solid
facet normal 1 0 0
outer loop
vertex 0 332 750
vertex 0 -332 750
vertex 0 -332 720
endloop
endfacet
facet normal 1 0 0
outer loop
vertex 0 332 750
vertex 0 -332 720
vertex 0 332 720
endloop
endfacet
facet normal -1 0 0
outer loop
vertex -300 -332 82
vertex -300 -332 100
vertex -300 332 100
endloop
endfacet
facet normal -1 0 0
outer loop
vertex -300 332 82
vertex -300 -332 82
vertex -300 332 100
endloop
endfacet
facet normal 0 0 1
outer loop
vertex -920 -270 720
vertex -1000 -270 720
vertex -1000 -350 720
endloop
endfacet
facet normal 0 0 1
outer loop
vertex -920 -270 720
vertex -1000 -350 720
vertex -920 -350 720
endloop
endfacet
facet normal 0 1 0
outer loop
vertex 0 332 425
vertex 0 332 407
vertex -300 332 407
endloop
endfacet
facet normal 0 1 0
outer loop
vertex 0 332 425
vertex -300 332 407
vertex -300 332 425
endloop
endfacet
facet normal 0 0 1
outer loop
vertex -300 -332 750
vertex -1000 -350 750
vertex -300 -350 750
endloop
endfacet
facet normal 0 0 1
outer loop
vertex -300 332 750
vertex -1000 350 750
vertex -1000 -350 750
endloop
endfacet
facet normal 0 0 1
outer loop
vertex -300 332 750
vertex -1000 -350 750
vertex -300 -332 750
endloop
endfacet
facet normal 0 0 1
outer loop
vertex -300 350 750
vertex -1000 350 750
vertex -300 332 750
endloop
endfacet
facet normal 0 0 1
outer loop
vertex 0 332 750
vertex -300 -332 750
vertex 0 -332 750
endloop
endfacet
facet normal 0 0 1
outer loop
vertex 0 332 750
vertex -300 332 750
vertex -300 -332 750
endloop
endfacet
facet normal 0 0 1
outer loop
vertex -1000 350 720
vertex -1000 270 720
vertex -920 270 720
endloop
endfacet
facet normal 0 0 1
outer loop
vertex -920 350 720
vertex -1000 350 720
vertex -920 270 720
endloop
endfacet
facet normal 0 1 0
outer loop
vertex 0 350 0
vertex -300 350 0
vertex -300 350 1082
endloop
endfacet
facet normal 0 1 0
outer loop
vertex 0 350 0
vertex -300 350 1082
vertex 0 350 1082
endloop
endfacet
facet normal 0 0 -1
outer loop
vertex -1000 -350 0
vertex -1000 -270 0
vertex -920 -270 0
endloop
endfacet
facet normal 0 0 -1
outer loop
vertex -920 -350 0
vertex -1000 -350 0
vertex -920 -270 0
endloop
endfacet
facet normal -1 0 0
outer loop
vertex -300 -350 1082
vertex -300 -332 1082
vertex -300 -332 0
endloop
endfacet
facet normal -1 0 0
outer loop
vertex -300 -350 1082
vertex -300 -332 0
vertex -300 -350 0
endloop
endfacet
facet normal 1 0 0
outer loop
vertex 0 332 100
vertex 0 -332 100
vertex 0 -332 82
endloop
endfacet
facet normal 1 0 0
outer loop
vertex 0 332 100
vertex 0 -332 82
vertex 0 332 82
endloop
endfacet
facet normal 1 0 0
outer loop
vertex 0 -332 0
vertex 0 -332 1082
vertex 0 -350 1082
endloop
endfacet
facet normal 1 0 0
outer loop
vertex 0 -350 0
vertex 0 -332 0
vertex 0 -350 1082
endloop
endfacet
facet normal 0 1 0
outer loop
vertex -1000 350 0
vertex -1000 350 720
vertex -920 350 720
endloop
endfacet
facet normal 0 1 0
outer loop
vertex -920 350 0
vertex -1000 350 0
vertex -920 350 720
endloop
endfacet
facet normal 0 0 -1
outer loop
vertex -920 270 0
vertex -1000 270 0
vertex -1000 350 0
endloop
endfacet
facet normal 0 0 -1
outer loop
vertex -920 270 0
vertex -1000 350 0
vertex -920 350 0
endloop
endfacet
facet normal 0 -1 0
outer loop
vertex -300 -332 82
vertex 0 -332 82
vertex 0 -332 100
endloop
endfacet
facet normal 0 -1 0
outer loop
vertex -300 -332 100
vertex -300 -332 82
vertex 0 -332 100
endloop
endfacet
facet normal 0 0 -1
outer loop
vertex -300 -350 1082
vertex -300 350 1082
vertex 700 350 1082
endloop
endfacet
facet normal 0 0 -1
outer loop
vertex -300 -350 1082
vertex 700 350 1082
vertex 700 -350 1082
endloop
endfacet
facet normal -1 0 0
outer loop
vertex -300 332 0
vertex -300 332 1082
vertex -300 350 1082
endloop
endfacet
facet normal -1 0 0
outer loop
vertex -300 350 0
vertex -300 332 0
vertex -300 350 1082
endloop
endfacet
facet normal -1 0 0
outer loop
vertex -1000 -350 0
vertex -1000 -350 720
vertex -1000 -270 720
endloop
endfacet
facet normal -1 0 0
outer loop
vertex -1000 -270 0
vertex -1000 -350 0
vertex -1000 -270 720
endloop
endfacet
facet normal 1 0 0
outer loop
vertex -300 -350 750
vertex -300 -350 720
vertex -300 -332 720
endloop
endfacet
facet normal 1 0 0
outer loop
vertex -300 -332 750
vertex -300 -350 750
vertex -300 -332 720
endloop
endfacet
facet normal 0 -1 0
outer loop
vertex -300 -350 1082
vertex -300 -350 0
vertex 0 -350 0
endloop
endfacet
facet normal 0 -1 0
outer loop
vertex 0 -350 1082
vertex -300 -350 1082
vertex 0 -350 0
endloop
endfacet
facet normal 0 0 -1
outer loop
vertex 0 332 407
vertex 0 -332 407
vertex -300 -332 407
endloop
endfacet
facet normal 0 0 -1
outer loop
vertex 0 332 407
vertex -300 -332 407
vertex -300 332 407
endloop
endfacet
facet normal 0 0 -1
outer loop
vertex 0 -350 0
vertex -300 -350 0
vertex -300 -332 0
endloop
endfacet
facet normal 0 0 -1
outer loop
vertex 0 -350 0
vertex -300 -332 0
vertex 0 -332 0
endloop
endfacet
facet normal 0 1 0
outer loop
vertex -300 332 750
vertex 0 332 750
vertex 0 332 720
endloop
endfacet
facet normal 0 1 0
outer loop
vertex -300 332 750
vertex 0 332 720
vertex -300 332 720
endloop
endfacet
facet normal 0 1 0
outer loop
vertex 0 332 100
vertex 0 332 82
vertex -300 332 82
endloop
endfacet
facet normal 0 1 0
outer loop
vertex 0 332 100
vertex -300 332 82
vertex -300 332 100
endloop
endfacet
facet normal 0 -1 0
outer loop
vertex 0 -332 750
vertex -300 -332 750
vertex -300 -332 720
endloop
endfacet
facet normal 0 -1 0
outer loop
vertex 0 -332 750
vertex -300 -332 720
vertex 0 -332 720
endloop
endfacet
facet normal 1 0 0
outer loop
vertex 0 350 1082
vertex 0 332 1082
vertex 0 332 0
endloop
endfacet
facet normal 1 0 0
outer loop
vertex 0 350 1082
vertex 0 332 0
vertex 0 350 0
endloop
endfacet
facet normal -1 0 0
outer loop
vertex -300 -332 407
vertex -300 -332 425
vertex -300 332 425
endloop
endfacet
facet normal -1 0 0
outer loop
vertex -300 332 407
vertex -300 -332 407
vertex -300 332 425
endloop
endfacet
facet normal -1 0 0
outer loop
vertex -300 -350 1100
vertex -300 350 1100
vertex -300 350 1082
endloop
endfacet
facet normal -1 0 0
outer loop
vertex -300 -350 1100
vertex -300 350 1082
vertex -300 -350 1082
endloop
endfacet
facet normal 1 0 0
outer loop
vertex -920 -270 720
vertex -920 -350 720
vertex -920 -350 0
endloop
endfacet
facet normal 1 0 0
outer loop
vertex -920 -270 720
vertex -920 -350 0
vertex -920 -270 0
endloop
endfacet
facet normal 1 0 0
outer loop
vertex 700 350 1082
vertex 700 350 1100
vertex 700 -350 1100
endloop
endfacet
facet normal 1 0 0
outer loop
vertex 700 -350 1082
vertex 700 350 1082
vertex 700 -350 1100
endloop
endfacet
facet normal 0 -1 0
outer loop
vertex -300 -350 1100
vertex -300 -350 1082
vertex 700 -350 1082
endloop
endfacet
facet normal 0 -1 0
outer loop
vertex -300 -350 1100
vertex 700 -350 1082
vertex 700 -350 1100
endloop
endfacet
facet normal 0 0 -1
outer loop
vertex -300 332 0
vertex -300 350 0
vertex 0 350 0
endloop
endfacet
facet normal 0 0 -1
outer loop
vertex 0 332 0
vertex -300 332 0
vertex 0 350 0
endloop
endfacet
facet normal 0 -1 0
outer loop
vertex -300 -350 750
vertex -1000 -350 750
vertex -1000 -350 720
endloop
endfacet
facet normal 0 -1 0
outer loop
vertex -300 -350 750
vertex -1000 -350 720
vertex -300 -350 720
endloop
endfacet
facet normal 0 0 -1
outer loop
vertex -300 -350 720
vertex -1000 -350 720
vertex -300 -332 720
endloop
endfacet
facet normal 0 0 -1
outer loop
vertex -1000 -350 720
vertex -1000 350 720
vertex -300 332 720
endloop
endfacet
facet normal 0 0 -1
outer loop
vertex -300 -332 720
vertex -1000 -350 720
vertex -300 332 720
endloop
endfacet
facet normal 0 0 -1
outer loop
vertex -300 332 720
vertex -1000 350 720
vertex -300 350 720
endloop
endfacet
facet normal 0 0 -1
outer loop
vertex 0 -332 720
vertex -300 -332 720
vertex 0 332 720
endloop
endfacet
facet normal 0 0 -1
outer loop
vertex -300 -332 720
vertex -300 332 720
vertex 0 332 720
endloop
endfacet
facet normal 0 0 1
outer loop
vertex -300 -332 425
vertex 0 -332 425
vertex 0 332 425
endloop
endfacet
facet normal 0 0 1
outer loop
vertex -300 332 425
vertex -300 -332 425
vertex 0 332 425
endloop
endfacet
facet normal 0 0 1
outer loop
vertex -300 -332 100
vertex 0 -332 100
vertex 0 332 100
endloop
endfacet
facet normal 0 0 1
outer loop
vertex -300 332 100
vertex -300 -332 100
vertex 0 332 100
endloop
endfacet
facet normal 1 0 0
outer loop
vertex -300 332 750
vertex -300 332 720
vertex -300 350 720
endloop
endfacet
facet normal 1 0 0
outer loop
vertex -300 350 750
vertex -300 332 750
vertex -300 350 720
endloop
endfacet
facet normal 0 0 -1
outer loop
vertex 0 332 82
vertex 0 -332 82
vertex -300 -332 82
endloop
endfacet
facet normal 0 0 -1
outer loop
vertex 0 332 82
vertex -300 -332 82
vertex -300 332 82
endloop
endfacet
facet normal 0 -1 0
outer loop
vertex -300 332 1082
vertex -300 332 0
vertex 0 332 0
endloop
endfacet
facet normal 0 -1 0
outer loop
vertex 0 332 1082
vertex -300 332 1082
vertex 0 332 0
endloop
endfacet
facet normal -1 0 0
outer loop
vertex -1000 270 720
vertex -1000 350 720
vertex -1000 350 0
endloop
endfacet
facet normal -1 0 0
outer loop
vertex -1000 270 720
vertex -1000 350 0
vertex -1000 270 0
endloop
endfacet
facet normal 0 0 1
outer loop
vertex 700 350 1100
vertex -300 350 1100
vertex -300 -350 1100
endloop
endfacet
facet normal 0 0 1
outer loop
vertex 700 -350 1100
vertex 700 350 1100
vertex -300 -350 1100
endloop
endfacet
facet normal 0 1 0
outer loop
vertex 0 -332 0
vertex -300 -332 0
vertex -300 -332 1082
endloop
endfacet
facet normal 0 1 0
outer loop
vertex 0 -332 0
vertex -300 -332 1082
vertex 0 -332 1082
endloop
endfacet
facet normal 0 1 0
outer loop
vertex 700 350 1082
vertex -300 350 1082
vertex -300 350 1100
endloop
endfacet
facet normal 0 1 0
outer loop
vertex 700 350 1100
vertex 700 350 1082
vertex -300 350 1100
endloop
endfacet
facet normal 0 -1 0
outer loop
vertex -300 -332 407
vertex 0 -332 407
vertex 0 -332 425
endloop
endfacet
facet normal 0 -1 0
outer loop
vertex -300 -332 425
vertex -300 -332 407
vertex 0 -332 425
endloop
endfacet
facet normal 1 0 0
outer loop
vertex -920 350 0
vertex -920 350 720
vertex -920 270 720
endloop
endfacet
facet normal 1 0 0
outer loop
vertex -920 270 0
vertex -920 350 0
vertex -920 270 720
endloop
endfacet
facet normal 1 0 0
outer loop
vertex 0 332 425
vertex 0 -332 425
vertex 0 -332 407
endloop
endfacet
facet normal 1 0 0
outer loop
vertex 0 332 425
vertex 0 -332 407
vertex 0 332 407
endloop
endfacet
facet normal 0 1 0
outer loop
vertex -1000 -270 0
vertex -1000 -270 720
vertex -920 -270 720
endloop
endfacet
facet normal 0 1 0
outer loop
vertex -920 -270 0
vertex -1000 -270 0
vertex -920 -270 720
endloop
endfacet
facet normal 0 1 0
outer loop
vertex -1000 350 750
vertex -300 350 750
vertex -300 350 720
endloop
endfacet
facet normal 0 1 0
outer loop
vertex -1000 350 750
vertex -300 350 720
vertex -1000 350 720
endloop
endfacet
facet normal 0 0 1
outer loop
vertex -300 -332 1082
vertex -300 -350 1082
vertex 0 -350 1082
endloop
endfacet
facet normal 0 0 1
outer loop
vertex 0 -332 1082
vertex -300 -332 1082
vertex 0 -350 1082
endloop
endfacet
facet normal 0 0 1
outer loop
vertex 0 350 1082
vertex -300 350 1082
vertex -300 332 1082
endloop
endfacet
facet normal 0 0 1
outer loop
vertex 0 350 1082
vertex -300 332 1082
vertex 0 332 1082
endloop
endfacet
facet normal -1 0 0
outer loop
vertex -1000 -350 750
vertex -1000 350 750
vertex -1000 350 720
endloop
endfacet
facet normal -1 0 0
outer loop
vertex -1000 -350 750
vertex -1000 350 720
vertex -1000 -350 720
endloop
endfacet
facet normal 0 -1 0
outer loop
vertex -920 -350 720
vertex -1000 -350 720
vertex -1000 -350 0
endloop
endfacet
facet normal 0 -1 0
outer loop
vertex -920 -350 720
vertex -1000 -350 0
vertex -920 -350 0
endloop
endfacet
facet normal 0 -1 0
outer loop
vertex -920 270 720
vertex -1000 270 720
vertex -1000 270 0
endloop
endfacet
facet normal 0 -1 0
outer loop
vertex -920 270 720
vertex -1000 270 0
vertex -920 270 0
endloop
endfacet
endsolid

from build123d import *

# Parameters (mm, degrees)
F0_W      = 300
F0_H      = 18
F1_DEPTH  = 1082
F3_W      = 700
F3_H      = 18
F4_DEPTH  = 1000
F7_DEPTH  = 30
F8_W      = 664
F8_H      = 18
F9_DEPTH  = 300
F10_W     = 80
F10_H     = 80
F11_DEPTH = 720


with BuildPart() as f1:
    # F0 (on Top) → F1 (new body)
    with BuildSketch(Plane.XY):
        with Locations((-150, 341)):
            Rectangle(F0_W, F0_H)
    extrude(amount=F1_DEPTH)


with BuildPart() as f2_1:
    # F2: instance of F1
    add(f1.part.mirror(Plane.XZ))


with BuildPart() as f4:
    # F3 (on face) → F4 (new body)
    with BuildSketch(Plane(origin=(-300, 0, 0), x_dir=(0, -1, 0), z_dir=(-1, 0, 0))):
        with Locations((0, 1091)):
            Rectangle(F3_W, F3_H)
    extrude(amount=-F4_DEPTH)


with BuildPart() as f7:
    # F6 (on offset) → F7 (new body)
    with BuildSketch(Plane.XY.offset(750)):
        Polygon((0, -332), (0, 332), (-300, 332), (-300, 350), (-1000, 350), (-1000, -350), (-300, -350), (-300, -332), align=None)
    extrude(amount=-F7_DEPTH)


with BuildPart() as f9:
    # F8 (on face) → F9 (new body, through all)
    with BuildSketch(Plane.YZ):
        with Locations((0, 91)):
            Rectangle(F8_W, F8_H)
        with Locations((0, 416)):
            Rectangle(F8_W, F8_H)
    extrude(amount=-F9_DEPTH)


with BuildPart() as f11:
    # F10 (on face) → F11 (new body, through all)
    with BuildSketch(Plane(origin=(0, 0, 720), x_dir=(1, 0, 0), z_dir=(0, 0, -1))):
        with Locations((-960, -310)):
            Rectangle(F10_W, F10_H)
    extrude(amount=F11_DEPTH)


with BuildPart() as f12_1:
    # F12: instance of F11
    add(f11.part.mirror(Plane.XZ))


solid = Compound([f1.part, f2_1.part, f4.part, f7.part, f9.part, f11.part, f12_1.part])
